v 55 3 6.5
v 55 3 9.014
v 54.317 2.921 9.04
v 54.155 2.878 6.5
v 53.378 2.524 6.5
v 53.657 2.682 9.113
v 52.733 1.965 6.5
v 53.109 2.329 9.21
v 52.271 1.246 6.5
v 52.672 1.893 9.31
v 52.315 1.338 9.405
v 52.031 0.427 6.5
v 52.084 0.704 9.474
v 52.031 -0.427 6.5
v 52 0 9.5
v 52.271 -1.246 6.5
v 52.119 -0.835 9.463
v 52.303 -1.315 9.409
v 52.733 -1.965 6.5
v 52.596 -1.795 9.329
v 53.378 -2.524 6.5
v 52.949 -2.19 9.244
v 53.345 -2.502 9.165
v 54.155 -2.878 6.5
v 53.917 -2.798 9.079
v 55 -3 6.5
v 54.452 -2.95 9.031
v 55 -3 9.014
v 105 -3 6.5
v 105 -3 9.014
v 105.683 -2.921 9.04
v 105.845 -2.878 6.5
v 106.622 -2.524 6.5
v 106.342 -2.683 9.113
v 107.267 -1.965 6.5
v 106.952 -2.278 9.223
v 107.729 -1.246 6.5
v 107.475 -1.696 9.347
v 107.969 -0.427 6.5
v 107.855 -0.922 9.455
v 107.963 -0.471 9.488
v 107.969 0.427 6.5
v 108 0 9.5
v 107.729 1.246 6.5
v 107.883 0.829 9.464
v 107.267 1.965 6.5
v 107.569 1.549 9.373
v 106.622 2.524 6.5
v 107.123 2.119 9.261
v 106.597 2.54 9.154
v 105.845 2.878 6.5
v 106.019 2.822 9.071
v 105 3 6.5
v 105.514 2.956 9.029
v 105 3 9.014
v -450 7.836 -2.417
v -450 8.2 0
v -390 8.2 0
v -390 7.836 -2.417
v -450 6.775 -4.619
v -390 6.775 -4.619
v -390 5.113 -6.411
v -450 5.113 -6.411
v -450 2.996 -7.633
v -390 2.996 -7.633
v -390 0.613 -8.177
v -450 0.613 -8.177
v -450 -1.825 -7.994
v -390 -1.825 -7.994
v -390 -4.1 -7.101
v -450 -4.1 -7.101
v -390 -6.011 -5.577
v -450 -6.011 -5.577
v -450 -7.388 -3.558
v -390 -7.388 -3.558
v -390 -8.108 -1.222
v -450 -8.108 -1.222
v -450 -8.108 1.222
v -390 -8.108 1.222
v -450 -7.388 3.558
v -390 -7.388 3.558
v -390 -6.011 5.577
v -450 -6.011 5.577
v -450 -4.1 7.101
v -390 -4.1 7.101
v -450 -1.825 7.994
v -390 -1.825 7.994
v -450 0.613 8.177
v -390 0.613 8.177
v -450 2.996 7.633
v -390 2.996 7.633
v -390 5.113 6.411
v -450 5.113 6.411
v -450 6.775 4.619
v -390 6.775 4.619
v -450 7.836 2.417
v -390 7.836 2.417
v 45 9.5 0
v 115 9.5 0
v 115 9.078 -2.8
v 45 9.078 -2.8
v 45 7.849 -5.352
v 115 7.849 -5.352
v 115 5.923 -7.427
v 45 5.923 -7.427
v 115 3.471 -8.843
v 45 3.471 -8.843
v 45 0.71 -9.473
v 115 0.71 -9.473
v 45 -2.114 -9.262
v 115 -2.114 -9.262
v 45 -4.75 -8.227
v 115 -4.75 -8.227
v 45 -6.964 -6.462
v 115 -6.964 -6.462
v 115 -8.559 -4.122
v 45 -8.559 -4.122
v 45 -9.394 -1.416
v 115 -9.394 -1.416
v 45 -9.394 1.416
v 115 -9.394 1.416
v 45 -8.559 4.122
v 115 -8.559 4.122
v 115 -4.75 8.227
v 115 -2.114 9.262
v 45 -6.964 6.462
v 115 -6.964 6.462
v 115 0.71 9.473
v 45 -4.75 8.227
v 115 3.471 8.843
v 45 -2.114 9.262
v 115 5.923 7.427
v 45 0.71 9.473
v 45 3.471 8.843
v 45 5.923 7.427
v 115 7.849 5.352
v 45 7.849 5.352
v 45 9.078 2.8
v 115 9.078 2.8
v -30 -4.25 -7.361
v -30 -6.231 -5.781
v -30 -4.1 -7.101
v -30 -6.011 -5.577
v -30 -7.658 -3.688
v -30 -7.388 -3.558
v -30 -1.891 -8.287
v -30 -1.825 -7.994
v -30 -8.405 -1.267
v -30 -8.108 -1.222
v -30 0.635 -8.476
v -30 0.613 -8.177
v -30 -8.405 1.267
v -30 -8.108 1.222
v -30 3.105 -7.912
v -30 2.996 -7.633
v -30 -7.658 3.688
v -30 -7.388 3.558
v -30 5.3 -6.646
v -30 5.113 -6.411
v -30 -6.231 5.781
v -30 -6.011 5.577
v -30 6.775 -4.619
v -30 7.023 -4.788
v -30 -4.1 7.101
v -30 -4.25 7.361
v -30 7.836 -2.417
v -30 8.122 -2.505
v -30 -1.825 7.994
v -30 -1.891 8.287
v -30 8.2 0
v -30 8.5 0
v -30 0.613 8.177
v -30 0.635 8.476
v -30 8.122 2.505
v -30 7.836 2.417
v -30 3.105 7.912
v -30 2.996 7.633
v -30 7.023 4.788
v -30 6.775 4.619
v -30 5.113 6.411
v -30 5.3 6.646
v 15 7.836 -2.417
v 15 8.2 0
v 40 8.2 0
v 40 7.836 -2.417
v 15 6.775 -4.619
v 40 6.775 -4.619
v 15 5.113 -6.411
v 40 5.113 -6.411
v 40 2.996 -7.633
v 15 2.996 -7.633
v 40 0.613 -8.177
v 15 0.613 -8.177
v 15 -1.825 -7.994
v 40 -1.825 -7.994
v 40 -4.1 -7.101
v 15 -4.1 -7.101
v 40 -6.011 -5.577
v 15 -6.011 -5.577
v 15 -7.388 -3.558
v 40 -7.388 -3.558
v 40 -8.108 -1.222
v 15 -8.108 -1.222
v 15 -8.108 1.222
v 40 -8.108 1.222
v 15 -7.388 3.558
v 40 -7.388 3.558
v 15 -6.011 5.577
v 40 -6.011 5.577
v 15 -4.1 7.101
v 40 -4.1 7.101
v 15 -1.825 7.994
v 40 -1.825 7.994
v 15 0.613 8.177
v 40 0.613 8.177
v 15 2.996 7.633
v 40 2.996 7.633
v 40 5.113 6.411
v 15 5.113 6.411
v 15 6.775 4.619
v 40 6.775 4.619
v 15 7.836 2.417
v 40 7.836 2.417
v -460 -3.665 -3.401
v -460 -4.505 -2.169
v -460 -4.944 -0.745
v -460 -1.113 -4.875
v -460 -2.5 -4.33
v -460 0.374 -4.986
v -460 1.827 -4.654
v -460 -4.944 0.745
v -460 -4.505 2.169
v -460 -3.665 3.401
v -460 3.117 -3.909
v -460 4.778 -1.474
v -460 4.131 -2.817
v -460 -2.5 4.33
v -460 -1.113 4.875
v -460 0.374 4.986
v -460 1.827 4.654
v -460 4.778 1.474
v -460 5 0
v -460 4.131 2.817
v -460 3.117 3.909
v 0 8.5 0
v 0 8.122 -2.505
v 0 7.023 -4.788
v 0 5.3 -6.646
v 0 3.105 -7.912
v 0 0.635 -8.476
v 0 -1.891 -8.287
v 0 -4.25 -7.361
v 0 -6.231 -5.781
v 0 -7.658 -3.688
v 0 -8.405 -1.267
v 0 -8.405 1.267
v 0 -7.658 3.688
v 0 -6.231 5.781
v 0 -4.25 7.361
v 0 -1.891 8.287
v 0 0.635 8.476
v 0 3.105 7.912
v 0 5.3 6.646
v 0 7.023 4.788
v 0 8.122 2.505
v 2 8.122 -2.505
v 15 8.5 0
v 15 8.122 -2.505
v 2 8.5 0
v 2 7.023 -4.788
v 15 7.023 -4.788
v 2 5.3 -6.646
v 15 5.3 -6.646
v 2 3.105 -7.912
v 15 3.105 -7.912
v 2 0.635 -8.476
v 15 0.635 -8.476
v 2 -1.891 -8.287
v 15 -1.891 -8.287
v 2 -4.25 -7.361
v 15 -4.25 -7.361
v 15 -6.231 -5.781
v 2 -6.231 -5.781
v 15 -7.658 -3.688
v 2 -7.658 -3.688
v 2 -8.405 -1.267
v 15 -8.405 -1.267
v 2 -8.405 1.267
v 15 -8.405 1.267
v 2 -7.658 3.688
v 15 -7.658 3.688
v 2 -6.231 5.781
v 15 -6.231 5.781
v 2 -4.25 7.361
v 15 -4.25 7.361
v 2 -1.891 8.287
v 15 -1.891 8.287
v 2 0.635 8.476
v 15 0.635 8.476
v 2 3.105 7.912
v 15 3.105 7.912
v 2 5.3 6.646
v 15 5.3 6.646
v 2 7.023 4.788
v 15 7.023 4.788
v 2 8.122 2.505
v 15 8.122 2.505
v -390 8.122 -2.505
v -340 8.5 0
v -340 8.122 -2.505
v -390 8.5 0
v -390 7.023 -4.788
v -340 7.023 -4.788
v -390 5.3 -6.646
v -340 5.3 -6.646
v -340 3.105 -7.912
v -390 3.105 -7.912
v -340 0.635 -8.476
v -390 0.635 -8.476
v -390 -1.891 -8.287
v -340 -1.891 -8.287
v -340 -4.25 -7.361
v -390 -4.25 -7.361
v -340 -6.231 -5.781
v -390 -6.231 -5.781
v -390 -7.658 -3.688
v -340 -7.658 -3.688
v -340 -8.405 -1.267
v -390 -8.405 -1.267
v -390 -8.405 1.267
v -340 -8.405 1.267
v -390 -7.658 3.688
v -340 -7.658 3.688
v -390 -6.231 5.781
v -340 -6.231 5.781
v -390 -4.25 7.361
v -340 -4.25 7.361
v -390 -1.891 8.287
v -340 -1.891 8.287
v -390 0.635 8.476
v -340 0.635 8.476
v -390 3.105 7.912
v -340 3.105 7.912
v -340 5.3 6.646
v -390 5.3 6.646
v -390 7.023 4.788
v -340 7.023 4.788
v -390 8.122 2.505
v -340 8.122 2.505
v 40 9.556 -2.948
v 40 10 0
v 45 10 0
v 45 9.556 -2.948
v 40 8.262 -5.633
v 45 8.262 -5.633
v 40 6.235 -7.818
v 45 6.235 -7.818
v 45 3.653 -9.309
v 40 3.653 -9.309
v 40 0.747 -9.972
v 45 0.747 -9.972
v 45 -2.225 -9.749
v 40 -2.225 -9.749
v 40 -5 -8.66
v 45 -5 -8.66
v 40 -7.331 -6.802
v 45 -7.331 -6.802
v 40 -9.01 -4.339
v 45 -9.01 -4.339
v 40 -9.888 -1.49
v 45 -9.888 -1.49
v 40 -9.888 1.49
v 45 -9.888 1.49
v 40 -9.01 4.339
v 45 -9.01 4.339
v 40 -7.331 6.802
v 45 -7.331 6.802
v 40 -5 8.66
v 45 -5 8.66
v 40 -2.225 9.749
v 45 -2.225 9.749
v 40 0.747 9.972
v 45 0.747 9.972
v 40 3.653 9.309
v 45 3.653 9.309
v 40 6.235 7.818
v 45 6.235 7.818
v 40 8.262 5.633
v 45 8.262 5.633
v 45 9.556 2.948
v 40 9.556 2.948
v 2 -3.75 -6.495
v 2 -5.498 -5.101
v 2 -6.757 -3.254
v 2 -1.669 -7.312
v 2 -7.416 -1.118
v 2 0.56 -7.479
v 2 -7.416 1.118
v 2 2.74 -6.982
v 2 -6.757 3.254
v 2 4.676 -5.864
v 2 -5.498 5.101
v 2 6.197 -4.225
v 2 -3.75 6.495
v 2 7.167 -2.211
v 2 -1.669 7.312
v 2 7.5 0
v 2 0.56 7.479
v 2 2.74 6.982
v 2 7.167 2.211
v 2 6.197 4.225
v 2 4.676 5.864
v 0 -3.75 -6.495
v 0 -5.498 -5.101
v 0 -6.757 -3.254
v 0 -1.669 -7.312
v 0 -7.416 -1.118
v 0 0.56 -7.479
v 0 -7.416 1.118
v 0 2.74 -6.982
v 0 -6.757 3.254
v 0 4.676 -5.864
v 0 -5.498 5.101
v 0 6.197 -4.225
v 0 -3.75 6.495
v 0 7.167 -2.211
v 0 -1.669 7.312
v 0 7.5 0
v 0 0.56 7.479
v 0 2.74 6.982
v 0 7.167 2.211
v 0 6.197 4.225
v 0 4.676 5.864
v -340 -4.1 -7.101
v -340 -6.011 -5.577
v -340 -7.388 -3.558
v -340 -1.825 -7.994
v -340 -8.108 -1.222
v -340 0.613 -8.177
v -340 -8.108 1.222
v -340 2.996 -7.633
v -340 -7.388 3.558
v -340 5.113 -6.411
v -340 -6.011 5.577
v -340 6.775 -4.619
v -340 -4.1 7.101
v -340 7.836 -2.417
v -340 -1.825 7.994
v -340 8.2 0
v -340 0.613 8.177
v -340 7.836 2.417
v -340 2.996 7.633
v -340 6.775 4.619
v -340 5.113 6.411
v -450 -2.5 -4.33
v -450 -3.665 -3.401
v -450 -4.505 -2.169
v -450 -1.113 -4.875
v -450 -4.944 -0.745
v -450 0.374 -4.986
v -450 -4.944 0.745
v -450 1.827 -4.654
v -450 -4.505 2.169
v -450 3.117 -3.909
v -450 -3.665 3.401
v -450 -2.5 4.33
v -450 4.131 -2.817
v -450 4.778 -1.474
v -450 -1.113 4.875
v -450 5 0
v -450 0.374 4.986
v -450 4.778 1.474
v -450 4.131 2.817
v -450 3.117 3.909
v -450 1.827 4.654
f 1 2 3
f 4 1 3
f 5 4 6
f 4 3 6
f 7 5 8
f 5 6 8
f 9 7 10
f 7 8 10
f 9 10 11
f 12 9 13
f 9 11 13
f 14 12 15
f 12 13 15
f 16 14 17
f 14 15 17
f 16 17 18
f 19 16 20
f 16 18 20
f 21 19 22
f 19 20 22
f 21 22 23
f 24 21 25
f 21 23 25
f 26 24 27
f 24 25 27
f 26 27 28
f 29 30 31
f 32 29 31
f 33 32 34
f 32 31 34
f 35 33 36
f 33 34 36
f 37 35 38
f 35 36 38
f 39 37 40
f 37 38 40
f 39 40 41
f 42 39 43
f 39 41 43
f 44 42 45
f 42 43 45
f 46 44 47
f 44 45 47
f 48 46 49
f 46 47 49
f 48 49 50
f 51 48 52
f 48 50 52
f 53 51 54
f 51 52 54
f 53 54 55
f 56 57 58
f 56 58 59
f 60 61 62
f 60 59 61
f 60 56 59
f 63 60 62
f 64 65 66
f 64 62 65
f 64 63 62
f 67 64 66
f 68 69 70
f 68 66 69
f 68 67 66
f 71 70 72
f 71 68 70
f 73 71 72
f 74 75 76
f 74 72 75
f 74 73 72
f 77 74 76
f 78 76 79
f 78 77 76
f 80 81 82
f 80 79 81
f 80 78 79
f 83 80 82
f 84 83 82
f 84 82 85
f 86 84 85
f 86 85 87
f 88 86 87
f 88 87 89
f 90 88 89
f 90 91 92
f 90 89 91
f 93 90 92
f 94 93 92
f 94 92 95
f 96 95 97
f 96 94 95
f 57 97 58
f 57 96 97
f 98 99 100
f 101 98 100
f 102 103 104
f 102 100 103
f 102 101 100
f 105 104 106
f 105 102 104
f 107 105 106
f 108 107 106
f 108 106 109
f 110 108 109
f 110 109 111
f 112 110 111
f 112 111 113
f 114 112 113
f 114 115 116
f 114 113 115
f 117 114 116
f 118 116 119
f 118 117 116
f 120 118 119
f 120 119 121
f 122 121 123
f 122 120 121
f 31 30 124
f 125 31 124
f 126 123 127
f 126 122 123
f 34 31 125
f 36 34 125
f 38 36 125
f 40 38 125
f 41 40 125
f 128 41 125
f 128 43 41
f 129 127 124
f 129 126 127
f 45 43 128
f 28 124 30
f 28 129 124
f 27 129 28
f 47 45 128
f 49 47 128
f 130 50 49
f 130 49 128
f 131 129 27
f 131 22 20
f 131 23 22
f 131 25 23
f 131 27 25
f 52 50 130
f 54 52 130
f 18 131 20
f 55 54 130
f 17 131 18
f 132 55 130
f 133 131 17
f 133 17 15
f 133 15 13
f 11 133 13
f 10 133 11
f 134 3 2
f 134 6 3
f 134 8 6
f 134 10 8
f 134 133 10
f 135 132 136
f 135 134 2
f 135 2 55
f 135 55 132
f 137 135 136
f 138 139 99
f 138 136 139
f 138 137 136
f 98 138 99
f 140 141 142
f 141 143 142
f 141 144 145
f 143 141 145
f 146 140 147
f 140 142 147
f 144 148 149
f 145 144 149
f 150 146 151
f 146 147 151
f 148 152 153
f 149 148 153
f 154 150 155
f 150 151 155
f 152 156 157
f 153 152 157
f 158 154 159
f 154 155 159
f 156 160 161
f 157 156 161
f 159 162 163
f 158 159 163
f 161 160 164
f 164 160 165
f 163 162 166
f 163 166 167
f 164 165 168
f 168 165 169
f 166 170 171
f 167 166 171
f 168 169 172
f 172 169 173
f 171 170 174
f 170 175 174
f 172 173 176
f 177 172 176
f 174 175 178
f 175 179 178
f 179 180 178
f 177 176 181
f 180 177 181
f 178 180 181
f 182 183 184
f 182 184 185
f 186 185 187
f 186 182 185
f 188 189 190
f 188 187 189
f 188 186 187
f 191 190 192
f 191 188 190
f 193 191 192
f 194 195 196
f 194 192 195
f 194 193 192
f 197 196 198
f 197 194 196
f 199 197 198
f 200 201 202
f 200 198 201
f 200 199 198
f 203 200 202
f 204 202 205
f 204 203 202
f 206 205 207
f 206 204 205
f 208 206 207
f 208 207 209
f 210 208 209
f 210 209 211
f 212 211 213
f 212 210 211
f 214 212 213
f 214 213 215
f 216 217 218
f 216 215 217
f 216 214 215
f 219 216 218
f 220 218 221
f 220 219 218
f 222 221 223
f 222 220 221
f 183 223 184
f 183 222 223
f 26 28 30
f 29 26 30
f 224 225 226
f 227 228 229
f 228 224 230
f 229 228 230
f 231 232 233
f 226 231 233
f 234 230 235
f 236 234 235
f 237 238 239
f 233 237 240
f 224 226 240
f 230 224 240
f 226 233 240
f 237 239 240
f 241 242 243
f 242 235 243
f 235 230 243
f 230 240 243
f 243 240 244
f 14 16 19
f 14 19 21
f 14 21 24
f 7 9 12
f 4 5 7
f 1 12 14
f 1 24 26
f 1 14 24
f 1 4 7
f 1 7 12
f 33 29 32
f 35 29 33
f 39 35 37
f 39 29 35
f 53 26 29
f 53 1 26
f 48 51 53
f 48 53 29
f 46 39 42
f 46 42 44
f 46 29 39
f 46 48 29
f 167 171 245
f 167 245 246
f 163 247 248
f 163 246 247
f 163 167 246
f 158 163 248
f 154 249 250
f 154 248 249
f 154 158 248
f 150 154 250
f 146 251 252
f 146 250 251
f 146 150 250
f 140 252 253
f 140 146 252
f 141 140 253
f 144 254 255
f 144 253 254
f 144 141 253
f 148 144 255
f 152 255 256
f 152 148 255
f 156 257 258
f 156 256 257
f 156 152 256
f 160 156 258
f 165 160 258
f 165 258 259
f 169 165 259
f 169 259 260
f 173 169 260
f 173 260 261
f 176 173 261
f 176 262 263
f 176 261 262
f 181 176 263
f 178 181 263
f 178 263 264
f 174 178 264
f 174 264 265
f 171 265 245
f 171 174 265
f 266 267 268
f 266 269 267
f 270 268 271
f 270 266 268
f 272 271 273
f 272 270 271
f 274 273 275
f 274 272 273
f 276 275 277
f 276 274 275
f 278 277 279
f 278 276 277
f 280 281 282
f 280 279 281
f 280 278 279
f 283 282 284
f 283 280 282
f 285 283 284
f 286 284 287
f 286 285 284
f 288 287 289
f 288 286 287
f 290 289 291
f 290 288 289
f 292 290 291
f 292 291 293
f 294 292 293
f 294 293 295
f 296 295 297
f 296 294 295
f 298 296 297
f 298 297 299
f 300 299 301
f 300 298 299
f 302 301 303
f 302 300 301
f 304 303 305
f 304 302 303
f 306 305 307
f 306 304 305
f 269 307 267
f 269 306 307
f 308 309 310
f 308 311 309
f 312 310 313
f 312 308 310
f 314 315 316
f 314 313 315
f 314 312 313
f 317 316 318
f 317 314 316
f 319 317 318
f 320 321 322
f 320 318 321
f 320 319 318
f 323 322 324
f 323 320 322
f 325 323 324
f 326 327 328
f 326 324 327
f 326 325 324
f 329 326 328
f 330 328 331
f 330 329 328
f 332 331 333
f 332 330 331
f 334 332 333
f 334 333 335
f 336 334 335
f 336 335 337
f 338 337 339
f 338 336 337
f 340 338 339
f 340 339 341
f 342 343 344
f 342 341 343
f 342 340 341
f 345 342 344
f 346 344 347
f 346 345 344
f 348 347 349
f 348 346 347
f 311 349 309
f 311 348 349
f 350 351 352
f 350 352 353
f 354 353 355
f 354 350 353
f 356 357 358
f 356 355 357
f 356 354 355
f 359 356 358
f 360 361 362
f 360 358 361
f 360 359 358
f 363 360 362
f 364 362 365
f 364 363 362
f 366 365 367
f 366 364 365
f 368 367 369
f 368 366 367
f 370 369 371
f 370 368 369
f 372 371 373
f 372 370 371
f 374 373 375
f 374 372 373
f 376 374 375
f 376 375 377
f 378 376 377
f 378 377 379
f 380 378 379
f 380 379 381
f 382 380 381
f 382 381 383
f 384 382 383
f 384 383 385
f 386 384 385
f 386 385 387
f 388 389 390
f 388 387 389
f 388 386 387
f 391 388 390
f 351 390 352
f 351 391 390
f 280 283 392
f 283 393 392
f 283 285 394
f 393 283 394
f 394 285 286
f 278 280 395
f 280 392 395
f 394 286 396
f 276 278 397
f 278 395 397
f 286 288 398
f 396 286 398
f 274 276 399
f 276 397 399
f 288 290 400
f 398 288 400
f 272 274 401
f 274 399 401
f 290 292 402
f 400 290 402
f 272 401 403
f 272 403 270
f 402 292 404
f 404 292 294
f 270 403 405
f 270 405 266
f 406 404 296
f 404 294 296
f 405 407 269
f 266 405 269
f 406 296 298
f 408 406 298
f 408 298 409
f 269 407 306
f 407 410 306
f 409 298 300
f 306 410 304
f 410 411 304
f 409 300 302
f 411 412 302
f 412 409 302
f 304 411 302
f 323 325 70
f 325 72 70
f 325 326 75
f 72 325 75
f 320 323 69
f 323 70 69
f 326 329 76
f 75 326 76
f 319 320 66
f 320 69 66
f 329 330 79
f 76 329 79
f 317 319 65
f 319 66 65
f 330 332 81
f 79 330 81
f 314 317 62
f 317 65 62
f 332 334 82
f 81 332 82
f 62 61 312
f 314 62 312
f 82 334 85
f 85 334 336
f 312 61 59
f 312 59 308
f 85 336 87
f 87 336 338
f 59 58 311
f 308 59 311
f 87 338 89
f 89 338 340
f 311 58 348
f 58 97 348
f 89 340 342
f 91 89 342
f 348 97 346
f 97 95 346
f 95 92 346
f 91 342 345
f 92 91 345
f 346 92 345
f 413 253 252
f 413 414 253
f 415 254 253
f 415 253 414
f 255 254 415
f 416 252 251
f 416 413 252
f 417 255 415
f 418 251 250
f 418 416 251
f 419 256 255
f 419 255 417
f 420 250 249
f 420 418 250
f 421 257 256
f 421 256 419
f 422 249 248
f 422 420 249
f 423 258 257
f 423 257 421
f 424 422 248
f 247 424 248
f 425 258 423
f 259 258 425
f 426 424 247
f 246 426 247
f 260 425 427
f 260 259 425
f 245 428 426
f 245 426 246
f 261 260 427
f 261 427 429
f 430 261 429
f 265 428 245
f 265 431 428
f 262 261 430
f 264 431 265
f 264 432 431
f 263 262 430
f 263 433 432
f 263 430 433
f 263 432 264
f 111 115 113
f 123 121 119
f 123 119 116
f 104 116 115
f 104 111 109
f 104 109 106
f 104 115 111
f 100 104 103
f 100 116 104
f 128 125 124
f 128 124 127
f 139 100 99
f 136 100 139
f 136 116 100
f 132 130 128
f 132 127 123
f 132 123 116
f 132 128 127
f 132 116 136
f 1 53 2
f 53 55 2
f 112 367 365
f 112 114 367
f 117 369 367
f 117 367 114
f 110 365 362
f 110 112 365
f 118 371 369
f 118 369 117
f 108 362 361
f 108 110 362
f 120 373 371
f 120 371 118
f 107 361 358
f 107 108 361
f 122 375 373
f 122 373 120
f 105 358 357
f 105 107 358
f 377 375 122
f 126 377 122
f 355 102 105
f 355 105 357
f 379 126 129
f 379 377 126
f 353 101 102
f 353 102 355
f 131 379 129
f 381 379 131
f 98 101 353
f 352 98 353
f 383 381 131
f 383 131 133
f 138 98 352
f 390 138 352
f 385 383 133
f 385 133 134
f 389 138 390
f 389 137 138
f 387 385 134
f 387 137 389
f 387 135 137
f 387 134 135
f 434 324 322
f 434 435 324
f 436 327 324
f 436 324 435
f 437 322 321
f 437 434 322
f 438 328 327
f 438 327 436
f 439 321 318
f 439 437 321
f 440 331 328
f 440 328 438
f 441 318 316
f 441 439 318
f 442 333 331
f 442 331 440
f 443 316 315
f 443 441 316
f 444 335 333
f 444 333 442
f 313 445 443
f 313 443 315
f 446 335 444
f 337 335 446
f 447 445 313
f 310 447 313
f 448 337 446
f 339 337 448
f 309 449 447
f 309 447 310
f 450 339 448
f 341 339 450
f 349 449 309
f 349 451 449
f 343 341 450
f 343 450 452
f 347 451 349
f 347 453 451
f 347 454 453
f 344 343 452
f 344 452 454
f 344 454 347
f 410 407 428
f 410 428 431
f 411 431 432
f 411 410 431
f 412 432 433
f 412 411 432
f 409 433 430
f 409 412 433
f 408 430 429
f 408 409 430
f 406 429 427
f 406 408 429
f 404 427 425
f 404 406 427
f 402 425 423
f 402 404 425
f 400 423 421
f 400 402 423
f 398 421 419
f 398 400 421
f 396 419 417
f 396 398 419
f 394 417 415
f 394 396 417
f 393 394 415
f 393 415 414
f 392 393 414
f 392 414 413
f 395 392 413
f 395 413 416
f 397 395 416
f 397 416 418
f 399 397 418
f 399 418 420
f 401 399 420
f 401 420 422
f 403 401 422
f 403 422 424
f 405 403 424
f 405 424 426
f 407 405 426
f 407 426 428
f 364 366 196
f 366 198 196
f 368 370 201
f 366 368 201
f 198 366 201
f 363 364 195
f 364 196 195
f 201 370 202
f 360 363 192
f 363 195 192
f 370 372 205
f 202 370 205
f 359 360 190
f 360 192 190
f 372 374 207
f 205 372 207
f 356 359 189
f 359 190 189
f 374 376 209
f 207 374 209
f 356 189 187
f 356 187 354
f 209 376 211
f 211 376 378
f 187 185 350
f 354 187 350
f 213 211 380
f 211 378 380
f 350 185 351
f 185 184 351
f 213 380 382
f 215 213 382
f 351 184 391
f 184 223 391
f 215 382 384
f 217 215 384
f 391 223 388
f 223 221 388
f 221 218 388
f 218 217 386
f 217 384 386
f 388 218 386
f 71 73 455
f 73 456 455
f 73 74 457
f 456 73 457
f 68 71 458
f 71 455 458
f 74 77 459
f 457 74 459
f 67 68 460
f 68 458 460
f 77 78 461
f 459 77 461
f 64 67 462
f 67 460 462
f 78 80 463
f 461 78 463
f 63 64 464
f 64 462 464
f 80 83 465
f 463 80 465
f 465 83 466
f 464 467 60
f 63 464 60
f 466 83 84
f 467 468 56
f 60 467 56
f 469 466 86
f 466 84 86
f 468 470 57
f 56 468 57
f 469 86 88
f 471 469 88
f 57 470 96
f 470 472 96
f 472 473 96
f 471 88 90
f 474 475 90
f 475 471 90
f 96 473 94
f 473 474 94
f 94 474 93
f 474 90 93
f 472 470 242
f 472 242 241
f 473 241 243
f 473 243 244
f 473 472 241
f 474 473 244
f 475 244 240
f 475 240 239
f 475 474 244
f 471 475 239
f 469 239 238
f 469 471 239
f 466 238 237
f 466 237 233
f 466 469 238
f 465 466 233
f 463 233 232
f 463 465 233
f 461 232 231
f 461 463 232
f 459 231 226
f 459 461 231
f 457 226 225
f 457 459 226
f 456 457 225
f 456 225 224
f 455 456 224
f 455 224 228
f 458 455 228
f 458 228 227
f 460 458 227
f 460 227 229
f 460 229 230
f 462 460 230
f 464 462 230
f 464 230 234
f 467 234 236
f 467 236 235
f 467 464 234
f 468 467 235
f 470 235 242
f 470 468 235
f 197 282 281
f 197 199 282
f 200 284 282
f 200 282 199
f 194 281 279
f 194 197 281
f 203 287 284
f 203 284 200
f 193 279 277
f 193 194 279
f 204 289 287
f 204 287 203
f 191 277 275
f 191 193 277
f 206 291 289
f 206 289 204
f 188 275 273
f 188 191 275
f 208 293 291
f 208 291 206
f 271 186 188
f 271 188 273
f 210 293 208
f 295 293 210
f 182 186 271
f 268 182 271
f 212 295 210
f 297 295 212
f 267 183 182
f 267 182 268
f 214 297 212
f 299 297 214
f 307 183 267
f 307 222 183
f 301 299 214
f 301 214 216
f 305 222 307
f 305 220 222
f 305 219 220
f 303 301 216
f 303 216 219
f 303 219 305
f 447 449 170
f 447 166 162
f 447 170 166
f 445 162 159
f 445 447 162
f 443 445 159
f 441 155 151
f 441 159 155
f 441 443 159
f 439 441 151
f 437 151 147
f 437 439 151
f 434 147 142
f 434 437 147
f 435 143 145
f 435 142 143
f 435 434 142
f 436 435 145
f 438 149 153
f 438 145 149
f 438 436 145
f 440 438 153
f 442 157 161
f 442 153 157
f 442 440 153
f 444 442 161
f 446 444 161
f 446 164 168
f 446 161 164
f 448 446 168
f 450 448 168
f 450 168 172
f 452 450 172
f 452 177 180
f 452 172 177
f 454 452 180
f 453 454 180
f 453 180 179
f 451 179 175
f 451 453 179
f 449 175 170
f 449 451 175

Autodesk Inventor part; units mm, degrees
ref_plane "YZ Plane" through (0, 0, 0) normal (1, 0, 0) x (0, 1, 0)
ref_plane "XZ Plane" through (0, 0, 0) normal (0, 1, 0) x (-1, 0, 0)
sketch "Sketch1" plane through (0, 0, 0) normal (0, 0, 1) x (1, 0, 0)
  line L0 (0, 0) -> (115, 0)
  line L1 (115, 0) -> (115, 8.2)
  line L2 (115, 8.2) -> (-25, 8.2)
  line L3 (-25, 8.2) -> (-460, 8.2)
  line L4 (-460, 8.2) -> (-460, 0)
  line L5 (-460, 0) -> (0, 0)
  line L6 (-340, 8.2) -> (-340, 8.5)
  line L7 (-340, 8.5) -> (-390, 8.5)
  line L8 (-390, 8.5) -> (-390, 8.2)
  line L9 (15, 8.2) -> (15, 8.5)
  line L10 (15, 8.5) -> (-30, 8.5)
  line L11 (-30, 8.5) -> (-30, 8.2)
  line L12 (115, 8.2) -> (115, 9.5)
  line L13 (115, 9.5) -> (45, 9.5)
  line L14 (45, 9.5) -> (45, 8.2)
  line L15 (45, 9.5) -> (45, 10)
  line L16 (45, 10) -> (40, 10)
  line L17 (40, 10) -> (40, 8.2)
  line L18 (0, 8.5) -> (0, 7.5)
  line L19 (0, 7.5) -> (2, 7.5)
  line L20 (2, 7.5) -> (2, 8.5)
  line L21 (-460, 5) -> (-450, 5)
  line L22 (-450, 5) -> (-450, 8.2)
  dimension "d0" = 16.4
  dimension "d3" = 17
  dimension "d5" = 50
  dimension "d6" = 460
  dimension "d7" = 45
  dimension "d9" = 17
  dimension "d10" = 115
  dimension "d11" = 19
  dimension "d12" = 20
  dimension "d13" = 5
  dimension "d14" = 70
  dimension "d16" = 15
  dimension "d17" = 2
  dimension "d18" = 15
  dimension "d19" = 340
  dimension "d25" = 10
  dimension "d26" = 10
revolve "Revolution1" add sketch "Sketch1" angle 360 about axis through (0, 0, 0) along (1, 0, 0) contours L5 L4 L21 L22 L3 L2 L18 L19 L20 L1 L0 | L2 L14 L13 L12 | L2 L17 L16 L15 L14 | L2 L20 L10 L9 | L8 L7 L6 L3 | L2 L3 L11 L10 L18
ref_plane "Work Plane1" through (80, 0, 9.5) normal (0, 0, 1) x (1, 0, 0)
sketch "Sketch2" plane through (80, 0, 9.5) normal (0, 0, 1) x (1, 0, 0)
  line L0 (35, -9.5) -> (35, 9.5) projected
  line L1 (25, 0) -> (-25, 0) construction
  line L2 (25, 3) -> (-25, 3)
  line L3 (-25, -3) -> (25, -3)
  arc A0 (25, -3) -> (25, 3) centre (25, 0) ccw
  arc A1 (-25, 3) -> (-25, -3) centre (-25, 0) ccw
  point P0 (-80, 0)
  point P1 (0, 0)
  point P2 (35, 0)
  dimension "d20" = 6
  dimension "d21" = 50
  dimension "d22" = 35
extrude "Extrusion1" cut sketch "Sketch2" against normal blind 3
properties part number "shaft 2"
